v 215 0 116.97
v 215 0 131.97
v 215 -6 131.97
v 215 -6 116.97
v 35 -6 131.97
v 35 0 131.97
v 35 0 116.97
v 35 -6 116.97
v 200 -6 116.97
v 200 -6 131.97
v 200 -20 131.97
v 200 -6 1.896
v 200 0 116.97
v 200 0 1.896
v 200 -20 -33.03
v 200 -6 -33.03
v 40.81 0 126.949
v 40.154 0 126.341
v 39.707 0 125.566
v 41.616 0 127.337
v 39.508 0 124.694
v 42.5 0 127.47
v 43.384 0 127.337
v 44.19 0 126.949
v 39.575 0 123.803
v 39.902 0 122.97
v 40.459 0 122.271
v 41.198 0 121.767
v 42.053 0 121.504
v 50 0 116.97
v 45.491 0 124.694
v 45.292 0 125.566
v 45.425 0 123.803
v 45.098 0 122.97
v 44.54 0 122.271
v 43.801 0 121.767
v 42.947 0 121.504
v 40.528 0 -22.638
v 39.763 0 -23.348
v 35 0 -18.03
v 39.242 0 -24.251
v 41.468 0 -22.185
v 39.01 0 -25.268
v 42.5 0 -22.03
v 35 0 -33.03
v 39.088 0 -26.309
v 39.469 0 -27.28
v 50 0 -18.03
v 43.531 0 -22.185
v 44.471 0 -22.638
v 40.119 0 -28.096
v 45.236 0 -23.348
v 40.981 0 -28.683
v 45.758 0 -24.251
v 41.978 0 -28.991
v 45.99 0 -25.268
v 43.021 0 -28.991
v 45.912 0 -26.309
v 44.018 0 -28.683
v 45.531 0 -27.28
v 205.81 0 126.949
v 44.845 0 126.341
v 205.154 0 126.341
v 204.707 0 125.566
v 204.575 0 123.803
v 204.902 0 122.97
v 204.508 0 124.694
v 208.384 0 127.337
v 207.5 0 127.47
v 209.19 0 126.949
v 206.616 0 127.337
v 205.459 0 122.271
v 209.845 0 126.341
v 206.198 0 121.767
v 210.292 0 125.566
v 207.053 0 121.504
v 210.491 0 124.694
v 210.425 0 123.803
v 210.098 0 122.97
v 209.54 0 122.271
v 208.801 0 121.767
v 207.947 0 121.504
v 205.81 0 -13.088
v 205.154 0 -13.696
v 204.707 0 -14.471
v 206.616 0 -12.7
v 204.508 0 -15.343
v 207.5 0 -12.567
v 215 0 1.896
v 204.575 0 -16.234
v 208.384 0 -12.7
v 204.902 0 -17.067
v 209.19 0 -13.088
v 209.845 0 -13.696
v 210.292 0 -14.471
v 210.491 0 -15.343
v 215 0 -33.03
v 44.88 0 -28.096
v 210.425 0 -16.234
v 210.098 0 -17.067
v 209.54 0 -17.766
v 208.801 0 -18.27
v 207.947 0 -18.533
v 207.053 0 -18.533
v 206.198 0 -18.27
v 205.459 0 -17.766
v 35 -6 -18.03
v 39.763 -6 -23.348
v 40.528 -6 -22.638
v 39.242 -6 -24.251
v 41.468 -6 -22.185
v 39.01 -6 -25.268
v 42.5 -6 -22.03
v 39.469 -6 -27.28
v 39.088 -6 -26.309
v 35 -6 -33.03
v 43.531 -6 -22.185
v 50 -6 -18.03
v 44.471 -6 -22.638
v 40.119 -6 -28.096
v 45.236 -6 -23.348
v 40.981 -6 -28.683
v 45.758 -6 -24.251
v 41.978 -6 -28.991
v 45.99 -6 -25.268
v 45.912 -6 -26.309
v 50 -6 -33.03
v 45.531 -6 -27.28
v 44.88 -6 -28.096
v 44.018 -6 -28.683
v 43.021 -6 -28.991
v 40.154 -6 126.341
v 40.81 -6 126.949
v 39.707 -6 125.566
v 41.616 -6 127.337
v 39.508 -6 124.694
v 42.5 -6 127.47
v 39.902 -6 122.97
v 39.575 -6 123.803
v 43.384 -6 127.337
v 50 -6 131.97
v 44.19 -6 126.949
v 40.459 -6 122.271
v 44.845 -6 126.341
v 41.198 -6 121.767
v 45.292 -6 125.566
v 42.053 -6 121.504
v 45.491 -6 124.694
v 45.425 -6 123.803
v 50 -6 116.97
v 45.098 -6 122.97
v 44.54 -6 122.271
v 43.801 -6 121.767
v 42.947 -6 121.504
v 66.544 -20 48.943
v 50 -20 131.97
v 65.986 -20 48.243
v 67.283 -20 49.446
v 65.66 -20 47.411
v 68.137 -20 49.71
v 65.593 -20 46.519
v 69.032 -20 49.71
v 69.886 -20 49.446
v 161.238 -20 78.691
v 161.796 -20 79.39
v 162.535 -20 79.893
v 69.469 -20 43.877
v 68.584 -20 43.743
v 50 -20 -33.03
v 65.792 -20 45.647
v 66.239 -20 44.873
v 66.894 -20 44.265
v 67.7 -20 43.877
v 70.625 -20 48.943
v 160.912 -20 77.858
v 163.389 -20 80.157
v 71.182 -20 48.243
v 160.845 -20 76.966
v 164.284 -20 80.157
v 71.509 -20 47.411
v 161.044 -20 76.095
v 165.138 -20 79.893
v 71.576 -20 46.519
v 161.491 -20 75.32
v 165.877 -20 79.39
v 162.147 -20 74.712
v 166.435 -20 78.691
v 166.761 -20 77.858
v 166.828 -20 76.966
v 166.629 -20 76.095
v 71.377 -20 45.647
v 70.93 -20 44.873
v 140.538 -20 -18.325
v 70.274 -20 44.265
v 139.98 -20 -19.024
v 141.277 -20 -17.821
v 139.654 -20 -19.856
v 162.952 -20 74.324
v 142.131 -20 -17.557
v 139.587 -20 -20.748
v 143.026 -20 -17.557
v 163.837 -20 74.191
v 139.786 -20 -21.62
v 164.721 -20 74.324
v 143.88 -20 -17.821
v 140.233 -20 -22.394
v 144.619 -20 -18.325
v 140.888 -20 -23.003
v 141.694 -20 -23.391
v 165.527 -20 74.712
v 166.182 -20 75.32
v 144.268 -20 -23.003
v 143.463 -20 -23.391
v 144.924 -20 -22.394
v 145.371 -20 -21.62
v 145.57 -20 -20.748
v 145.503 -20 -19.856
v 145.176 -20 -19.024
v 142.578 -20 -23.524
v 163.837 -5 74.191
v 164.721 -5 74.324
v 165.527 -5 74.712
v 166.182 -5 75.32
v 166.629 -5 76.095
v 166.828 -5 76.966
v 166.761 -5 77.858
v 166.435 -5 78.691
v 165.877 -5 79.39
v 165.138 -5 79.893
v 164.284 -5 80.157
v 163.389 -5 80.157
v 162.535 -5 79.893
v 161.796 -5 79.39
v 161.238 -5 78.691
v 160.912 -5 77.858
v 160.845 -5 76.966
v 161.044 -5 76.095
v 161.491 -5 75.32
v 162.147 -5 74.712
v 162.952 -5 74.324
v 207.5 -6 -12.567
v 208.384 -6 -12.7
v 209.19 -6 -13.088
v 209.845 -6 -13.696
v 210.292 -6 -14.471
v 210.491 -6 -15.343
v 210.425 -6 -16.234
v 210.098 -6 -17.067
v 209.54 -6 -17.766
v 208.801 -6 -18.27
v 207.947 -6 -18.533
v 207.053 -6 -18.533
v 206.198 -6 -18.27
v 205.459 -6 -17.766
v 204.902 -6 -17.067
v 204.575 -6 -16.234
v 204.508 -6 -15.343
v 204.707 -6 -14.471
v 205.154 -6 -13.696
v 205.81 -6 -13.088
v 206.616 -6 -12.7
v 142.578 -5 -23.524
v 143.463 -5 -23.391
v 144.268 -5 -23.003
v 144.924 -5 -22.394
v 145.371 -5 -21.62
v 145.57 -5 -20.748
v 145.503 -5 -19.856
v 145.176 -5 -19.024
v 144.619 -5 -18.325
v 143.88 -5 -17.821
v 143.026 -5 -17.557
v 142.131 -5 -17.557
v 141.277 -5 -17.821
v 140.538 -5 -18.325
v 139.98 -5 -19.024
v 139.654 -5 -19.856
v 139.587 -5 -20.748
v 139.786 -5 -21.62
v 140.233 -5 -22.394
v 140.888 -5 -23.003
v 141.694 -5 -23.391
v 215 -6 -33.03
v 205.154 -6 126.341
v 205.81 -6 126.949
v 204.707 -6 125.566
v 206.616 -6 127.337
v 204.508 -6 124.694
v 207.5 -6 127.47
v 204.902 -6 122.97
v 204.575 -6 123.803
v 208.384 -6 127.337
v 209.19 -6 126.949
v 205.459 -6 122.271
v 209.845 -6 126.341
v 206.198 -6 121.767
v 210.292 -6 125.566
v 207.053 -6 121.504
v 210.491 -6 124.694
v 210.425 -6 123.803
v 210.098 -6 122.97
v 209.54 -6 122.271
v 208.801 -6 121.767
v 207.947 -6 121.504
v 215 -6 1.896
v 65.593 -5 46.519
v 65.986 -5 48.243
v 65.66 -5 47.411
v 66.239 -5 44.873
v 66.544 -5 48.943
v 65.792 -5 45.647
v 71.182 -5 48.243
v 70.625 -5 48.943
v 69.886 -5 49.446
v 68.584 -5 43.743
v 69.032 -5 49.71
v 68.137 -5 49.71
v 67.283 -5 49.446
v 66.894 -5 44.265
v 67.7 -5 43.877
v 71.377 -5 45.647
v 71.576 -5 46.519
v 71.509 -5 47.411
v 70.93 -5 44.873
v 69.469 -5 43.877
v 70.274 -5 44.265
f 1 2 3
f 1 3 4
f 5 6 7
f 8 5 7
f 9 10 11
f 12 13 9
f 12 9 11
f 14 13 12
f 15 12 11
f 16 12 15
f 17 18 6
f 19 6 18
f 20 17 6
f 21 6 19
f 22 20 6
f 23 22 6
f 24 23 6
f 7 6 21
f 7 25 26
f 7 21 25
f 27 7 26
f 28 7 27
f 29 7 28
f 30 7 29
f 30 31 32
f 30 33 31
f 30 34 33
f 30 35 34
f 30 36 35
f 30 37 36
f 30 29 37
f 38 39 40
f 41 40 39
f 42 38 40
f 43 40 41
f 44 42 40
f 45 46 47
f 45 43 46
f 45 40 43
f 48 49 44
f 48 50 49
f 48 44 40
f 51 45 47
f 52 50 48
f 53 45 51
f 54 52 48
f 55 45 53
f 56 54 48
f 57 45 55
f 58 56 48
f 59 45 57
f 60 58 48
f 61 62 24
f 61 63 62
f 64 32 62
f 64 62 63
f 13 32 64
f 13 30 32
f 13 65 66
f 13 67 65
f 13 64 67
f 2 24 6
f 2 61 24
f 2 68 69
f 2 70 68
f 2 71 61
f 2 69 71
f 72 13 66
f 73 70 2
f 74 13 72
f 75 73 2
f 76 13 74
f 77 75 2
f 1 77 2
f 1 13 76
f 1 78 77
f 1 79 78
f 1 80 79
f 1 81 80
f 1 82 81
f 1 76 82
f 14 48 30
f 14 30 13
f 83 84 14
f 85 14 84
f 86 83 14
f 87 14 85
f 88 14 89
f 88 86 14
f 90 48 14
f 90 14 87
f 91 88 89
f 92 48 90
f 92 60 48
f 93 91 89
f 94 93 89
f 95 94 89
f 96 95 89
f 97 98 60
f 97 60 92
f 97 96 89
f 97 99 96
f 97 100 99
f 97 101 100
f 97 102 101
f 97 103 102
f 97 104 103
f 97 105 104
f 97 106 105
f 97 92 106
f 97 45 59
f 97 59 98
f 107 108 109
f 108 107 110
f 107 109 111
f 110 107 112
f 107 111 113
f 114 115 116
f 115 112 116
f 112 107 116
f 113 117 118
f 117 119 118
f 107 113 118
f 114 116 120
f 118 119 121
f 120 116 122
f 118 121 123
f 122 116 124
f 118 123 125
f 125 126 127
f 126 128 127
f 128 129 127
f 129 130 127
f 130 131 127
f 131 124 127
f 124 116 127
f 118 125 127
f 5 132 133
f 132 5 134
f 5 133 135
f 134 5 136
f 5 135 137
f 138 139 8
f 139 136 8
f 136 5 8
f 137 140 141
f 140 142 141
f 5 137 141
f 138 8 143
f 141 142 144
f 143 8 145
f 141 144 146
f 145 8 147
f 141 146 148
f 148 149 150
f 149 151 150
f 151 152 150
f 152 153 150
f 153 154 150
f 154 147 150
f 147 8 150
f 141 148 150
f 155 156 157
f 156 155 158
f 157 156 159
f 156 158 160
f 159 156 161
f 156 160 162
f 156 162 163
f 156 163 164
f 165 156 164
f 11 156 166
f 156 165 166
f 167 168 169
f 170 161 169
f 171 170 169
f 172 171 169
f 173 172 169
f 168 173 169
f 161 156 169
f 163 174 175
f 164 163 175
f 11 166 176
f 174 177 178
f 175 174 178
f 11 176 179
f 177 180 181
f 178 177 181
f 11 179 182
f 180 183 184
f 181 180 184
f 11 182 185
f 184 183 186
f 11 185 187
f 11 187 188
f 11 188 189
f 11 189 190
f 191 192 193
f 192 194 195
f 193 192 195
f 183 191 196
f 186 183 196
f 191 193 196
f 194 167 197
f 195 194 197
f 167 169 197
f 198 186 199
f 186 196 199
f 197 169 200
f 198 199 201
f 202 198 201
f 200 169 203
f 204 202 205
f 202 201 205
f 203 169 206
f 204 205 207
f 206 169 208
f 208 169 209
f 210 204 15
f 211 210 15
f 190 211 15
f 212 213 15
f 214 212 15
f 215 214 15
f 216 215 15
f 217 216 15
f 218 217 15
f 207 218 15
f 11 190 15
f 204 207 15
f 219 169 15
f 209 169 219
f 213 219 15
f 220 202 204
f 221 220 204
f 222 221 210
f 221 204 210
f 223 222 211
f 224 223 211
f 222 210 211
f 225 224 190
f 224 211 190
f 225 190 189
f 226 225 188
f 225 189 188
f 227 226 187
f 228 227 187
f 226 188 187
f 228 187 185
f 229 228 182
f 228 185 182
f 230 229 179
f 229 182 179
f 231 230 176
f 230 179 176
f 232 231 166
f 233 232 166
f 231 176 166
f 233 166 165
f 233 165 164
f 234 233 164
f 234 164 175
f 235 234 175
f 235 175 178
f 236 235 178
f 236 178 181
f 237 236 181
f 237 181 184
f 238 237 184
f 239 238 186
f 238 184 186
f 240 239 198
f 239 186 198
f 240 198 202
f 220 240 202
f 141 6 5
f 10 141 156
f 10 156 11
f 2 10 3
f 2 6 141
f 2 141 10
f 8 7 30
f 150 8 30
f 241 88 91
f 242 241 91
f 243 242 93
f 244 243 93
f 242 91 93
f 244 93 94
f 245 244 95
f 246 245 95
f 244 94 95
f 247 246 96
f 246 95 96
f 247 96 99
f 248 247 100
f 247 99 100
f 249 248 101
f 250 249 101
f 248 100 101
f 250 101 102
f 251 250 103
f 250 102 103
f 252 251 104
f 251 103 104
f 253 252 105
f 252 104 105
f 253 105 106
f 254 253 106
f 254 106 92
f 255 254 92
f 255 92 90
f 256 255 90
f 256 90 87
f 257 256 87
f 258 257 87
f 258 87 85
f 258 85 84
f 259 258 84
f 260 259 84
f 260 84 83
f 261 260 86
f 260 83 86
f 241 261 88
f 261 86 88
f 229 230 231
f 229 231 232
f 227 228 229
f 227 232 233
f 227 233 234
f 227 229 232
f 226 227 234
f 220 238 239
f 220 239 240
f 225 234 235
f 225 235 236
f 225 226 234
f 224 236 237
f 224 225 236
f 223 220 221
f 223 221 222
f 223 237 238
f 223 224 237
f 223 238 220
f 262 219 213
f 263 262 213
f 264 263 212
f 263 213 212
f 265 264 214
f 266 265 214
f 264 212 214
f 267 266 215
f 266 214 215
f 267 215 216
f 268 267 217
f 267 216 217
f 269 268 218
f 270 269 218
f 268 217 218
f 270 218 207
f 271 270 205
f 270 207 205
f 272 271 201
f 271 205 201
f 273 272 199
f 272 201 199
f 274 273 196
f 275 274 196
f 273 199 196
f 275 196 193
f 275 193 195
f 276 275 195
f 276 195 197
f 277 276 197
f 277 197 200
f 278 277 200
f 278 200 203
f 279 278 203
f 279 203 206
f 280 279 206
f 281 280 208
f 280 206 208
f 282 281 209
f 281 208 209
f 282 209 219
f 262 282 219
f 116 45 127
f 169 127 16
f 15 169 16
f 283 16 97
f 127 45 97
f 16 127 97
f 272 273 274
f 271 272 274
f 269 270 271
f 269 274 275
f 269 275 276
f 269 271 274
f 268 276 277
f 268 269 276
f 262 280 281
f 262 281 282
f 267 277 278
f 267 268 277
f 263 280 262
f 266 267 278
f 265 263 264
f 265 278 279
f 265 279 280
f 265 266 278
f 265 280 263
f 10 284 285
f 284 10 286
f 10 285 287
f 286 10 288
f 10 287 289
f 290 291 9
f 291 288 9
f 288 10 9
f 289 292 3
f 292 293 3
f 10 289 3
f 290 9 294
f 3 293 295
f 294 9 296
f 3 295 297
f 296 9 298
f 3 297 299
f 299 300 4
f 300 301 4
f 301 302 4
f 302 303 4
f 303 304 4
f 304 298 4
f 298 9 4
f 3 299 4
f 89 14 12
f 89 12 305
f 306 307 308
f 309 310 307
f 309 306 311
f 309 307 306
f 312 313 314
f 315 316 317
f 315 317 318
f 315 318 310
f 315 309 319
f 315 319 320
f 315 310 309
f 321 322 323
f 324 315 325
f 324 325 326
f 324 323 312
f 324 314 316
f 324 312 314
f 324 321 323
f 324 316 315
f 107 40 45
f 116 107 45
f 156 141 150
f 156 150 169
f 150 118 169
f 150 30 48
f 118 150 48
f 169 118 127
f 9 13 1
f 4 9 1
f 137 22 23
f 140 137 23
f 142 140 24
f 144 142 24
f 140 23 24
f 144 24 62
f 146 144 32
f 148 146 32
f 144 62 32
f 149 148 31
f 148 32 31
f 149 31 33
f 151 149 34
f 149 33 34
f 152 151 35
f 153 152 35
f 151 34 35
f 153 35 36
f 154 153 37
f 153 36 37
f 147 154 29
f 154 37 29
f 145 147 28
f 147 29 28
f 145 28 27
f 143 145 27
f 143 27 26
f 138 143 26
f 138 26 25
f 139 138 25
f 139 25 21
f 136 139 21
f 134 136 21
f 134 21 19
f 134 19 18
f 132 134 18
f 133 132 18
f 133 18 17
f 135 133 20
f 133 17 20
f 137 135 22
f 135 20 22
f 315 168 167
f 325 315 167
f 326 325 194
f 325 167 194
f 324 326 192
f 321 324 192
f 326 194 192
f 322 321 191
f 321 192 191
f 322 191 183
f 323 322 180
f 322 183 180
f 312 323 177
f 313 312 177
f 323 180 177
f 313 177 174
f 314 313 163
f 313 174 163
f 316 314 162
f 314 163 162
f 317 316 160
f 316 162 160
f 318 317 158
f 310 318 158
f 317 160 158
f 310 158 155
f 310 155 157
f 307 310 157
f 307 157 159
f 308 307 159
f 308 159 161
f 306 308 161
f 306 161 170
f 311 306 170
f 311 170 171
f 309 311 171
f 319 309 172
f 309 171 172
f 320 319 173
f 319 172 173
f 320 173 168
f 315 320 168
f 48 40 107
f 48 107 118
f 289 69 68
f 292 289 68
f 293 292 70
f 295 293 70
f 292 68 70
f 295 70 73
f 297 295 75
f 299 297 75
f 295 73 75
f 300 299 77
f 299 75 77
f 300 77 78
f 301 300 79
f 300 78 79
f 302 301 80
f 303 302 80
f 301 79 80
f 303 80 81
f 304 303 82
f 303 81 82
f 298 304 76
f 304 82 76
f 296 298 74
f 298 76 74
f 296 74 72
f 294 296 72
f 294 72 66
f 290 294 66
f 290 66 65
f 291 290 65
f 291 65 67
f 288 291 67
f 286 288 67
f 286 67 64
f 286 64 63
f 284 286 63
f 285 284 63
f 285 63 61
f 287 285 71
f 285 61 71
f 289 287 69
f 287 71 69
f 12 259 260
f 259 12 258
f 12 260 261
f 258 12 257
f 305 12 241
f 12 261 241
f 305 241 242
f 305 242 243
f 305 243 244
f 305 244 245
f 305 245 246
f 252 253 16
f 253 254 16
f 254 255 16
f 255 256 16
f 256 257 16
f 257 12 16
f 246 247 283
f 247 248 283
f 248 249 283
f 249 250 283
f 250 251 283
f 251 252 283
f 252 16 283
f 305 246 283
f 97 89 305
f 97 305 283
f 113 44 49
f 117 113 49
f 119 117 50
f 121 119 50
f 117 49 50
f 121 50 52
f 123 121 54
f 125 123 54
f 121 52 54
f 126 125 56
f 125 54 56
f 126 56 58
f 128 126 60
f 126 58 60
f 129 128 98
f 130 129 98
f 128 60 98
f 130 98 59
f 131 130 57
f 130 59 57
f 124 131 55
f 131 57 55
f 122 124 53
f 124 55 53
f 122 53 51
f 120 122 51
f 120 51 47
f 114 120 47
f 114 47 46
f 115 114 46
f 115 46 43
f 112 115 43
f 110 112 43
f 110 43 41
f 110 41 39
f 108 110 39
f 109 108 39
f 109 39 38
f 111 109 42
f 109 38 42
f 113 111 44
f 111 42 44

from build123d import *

# Parameters (mm, degrees)
SKETCH_1_W          = 150
SKETCH_1_H          = 165
EXTRUDE_1_DEPTH     = 20
SKETCH_2_W          = 15
SKETCH_2_H          = 15
SKETCH_2_R          = 3.5
SKETCH_2_H_2        = 34.926404716
SKETCH_2_R_2        = 3
EXTRUDE_2_DEPTH     = 6
SKETCH_4_R          = 3
CUT_EXTRUDE_1_DEPTH = 15


with BuildPart() as part:
    # Эскиз1 → Бобышка-Вытянуть1 (new body)
    with BuildSketch(Plane(origin=(0, 0, 0), x_dir=(1, 0, 0), z_dir=(0, 1, 0))):
        with Locations((124.999768599, -49.470063243)):
            Rectangle(SKETCH_1_W, SKETCH_1_H)
    extrude(amount=-EXTRUDE_1_DEPTH)

    # Эскиз2 → Бобышка-Вытянуть2 (add)
    # profile 1 of 4: a face of its own
    with BuildSketch(Plane(origin=(0, 0, 0), x_dir=(1, 0, 0), z_dir=(0, 1, 0))):
        with Locations((42.499768599, 25.529936757)):
            Rectangle(SKETCH_2_W, SKETCH_2_H)
        with Locations(Location((42.499768599, 25.529936757, 0), (0, 0, 270))):
            Circle(SKETCH_2_R, mode=Mode.SUBTRACT)
    # profile 2 of 4: a face of its own
    with BuildSketch(Plane(origin=(0, 0, 0), x_dir=(1, 0, 0), z_dir=(0, 1, 0))):
        with Locations((207.499768599, 15.566734399)):
            Rectangle(SKETCH_2_W, SKETCH_2_H_2)
        with Locations(Location((207.499768599, 15.566734399, 0), (0, 0, 270))):
            Circle(SKETCH_2_R_2, mode=Mode.SUBTRACT)
    # profile 3 of 4: a face of its own
    with BuildSketch(Plane(origin=(0, 0, 0), x_dir=(1, 0, 0), z_dir=(0, 1, 0))):
        with Locations((207.499768599, -124.470063243)):
            Rectangle(SKETCH_2_W, SKETCH_2_H)
        with Locations(Location((207.499768599, -124.470063243, 0), (0, 0, 270))):
            Circle(SKETCH_2_R_2, mode=Mode.SUBTRACT)
    # profile 4 of 4: a face of its own
    with BuildSketch(Plane(origin=(0, 0, 0), x_dir=(1, 0, 0), z_dir=(0, 1, 0))):
        with Locations((42.499768599, -124.470063243)):
            Rectangle(SKETCH_2_W, SKETCH_2_H)
        with Locations(Location((42.499768599, -124.470063243, 0), (0, 0, 270))):
            Circle(SKETCH_2_R_2, mode=Mode.SUBTRACT)
    extrude(amount=-EXTRUDE_2_DEPTH)

    # Эскиз4 → Вырез-Вытянуть1 (cut)
    with BuildSketch(Plane.XZ.offset(20)):
        with Locations(Location((163.836550468, 77.190523299, 0), (0, 0, 270))):
            Circle(SKETCH_4_R)
        with Locations(Location((142.578381334, -20.523806485, 0), (0, 0, 270))):
            Circle(SKETCH_4_R)
        with Locations(Location((68.584373995, 46.743472914, 0), (0, 0, 270))):
            Circle(SKETCH_4_R)
    extrude(amount=-CUT_EXTRUDE_1_DEPTH, mode=Mode.SUBTRACT)


solid = part.part
